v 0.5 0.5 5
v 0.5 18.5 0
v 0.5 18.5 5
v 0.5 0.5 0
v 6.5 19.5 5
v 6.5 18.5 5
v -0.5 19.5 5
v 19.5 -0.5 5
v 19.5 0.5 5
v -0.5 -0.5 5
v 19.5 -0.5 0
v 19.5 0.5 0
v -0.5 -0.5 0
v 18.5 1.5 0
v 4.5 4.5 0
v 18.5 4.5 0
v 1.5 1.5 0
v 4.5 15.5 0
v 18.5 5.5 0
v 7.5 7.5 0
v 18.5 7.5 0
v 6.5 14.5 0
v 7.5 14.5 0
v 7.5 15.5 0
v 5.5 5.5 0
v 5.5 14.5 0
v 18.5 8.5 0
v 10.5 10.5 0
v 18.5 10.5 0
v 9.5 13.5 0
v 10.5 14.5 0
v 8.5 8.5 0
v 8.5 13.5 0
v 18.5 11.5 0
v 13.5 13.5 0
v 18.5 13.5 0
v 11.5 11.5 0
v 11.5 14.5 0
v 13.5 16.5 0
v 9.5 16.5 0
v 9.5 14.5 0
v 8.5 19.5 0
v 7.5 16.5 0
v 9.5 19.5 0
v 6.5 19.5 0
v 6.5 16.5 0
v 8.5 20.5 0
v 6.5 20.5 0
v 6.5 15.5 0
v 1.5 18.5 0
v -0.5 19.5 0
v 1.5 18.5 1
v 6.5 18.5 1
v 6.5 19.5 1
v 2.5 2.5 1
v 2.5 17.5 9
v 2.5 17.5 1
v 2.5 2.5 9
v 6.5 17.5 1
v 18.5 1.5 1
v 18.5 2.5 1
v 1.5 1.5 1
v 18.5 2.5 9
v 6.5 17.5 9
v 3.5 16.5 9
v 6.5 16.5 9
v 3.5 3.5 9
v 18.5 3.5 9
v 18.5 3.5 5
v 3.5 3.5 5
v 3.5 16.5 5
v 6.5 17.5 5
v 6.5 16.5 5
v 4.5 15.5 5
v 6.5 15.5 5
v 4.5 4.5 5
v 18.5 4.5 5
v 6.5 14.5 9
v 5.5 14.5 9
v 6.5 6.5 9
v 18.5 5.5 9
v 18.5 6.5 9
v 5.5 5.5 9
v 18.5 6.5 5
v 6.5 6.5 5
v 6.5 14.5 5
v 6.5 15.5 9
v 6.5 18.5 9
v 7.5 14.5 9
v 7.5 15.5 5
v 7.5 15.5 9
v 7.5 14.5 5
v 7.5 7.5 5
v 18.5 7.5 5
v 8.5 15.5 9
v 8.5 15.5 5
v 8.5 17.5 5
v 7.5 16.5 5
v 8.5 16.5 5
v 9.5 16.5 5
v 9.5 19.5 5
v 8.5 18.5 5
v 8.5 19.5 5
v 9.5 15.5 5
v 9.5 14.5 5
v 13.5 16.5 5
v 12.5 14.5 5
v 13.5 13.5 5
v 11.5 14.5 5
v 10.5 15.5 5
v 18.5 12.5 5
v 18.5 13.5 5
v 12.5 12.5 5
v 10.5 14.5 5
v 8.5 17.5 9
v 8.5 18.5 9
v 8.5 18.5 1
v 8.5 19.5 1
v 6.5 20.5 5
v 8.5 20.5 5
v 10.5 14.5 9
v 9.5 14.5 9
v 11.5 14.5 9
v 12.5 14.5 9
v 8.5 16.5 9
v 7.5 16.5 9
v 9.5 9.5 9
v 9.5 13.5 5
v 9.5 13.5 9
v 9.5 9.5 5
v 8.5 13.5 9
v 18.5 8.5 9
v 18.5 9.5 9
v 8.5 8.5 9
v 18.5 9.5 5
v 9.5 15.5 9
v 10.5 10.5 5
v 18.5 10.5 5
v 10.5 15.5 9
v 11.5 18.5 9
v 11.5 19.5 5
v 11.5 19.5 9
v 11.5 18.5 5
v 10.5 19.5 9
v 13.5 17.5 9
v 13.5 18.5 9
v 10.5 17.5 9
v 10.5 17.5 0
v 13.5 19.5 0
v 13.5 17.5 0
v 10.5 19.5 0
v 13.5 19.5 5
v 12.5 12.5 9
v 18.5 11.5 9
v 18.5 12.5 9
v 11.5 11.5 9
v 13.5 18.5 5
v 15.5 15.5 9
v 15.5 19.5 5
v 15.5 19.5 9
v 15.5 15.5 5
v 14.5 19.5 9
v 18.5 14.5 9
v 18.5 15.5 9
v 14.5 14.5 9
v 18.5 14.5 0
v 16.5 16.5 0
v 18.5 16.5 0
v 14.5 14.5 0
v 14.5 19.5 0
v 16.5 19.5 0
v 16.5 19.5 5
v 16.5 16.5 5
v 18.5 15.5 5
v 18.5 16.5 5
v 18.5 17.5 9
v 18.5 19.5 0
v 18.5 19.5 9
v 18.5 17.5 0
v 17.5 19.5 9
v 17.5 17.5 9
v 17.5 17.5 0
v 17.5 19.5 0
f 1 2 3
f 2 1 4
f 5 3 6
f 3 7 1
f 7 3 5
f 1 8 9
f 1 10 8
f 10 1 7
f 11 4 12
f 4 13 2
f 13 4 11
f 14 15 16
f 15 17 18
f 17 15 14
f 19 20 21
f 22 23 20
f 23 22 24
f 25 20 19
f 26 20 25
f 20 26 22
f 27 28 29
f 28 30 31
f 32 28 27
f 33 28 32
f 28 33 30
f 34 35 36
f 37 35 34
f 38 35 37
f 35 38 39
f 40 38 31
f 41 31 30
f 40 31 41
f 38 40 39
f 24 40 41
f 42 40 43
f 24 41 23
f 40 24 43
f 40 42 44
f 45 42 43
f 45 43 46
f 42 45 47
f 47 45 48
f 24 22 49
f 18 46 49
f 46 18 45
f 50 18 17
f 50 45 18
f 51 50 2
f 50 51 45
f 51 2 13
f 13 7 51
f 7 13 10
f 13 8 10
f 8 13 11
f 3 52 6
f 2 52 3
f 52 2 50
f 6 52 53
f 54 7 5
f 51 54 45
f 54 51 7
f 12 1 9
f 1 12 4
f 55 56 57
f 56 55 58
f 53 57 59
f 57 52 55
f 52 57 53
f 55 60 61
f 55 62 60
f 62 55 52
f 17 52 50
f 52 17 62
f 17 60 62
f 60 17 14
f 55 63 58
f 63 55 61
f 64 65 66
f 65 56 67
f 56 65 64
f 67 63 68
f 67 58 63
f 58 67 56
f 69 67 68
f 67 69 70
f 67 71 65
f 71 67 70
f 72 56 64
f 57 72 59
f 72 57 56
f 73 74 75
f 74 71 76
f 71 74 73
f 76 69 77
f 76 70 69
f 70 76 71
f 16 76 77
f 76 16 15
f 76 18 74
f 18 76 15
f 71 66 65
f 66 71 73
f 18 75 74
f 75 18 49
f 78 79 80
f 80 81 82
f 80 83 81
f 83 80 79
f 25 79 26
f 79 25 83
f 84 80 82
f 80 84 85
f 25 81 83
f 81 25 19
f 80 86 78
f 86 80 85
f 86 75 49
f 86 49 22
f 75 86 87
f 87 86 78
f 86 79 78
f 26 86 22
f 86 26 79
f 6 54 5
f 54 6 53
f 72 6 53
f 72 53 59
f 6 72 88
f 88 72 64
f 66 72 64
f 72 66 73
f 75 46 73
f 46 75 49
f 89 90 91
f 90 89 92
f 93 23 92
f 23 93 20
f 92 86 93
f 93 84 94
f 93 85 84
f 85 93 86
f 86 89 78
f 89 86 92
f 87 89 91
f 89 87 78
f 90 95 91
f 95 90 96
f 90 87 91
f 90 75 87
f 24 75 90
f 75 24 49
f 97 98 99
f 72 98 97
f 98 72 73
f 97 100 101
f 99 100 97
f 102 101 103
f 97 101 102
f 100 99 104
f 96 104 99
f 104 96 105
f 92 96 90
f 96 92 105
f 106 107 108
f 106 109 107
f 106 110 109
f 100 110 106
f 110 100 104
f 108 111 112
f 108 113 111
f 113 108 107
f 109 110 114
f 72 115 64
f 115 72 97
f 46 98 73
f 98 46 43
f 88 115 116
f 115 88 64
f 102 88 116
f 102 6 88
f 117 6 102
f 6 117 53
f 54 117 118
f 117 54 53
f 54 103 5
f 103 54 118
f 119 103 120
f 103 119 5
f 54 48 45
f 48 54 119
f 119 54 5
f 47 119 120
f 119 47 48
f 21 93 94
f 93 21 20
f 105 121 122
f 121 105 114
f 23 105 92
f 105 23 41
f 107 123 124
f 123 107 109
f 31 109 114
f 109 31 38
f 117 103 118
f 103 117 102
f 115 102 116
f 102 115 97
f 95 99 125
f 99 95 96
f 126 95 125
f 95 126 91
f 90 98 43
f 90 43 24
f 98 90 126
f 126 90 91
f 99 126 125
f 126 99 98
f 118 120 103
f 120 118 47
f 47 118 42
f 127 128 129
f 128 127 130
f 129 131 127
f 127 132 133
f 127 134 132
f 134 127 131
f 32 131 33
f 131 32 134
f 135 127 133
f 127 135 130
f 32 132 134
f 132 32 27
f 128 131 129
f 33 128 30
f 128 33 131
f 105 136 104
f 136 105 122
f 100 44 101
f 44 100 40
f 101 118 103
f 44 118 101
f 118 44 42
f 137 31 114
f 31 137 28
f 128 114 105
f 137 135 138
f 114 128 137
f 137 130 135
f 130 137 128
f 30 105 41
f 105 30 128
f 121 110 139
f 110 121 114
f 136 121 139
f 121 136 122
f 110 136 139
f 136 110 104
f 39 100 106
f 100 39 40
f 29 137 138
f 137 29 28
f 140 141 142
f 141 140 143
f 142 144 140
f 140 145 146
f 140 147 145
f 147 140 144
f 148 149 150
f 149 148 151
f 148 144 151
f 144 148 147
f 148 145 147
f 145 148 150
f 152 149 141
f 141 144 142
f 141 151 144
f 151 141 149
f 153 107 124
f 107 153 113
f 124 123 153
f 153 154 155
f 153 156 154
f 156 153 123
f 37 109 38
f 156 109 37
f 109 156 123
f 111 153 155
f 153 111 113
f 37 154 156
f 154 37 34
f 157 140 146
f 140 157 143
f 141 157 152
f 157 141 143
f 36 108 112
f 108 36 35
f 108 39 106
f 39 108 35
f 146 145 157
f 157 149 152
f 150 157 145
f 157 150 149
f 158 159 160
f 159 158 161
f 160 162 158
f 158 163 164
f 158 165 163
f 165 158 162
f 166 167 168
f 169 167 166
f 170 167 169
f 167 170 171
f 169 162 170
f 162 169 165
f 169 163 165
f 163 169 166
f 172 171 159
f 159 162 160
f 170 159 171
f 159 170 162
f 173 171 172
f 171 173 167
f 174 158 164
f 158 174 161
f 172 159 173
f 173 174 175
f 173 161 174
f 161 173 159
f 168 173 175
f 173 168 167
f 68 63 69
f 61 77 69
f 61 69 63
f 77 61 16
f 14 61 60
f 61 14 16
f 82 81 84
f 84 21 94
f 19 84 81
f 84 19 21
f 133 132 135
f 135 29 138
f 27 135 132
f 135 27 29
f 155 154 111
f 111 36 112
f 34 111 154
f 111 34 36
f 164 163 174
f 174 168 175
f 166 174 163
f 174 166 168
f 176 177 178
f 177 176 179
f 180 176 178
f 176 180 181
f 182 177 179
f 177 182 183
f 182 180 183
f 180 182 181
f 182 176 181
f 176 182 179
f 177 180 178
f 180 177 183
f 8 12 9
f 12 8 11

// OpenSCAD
union() {
    translate([0, 0, 2.5]) cube([1, 1, 5], center=true);
    translate([0, 1, 2.5]) cube([1, 1, 5], center=true);
    translate([0, 2, 2.5]) cube([1, 1, 5], center=true);
    translate([0, 3, 2.5]) cube([1, 1, 5], center=true);
    translate([0, 4, 2.5]) cube([1, 1, 5], center=true);
    translate([0, 5, 2.5]) cube([1, 1, 5], center=true);
    translate([0, 6, 2.5]) cube([1, 1, 5], center=true);
    translate([0, 7, 2.5]) cube([1, 1, 5], center=true);
    translate([0, 8, 2.5]) cube([1, 1, 5], center=true);
    translate([0, 9, 2.5]) cube([1, 1, 5], center=true);
    translate([0, 10, 2.5]) cube([1, 1, 5], center=true);
    translate([0, 11, 2.5]) cube([1, 1, 5], center=true);
    translate([0, 12, 2.5]) cube([1, 1, 5], center=true);
    translate([0, 13, 2.5]) cube([1, 1, 5], center=true);
    translate([0, 14, 2.5]) cube([1, 1, 5], center=true);
    translate([0, 15, 2.5]) cube([1, 1, 5], center=true);
    translate([0, 16, 2.5]) cube([1, 1, 5], center=true);
    translate([0, 17, 2.5]) cube([1, 1, 5], center=true);
    translate([0, 18, 2.5]) cube([1, 1, 5], center=true);
    translate([0, 19, 2.5]) cube([1, 1, 5], center=true);
    translate([1, 0, 2.5]) cube([1, 1, 5], center=true);
    translate([1, 19, 2.5]) cube([1, 1, 5], center=true);
    translate([2, 0, 2.5]) cube([1, 1, 5], center=true);
    translate([2, 2, 0.5]) cube([1, 1, 1], center=true);
    translate([2, 3, 0.5]) cube([1, 1, 1], center=true);
    translate([2, 4, 0.5]) cube([1, 1, 1], center=true);
    translate([2, 5, 0.5]) cube([1, 1, 1], center=true);
    translate([2, 6, 0.5]) cube([1, 1, 1], center=true);
    translate([2, 7, 0.5]) cube([1, 1, 1], center=true);
    translate([2, 8, 0.5]) cube([1, 1, 1], center=true);
    translate([2, 9, 0.5]) cube([1, 1, 1], center=true);
    translate([2, 10, 0.5]) cube([1, 1, 1], center=true);
    translate([2, 11, 0.5]) cube([1, 1, 1], center=true);
    translate([2, 12, 0.5]) cube([1, 1, 1], center=true);
    translate([2, 13, 0.5]) cube([1, 1, 1], center=true);
    translate([2, 14, 0.5]) cube([1, 1, 1], center=true);
    translate([2, 15, 0.5]) cube([1, 1, 1], center=true);
    translate([2, 16, 0.5]) cube([1, 1, 1], center=true);
    translate([2, 17, 0.5]) cube([1, 1, 1], center=true);
    translate([2, 18, 0.5]) cube([1, 1, 1], center=true);
    translate([2, 19, 2.5]) cube([1, 1, 5], center=true);
    translate([3, 0, 2.5]) cube([1, 1, 5], center=true);
    translate([3, 2, 0.5]) cube([1, 1, 1], center=true);
    translate([3, 3, 4.5]) cube([1, 1, 9], center=true);
    translate([3, 4, 4.5]) cube([1, 1, 9], center=true);
    translate([3, 5, 4.5]) cube([1, 1, 9], center=true);
    translate([3, 6, 4.5]) cube([1, 1, 9], center=true);
    translate([3, 7, 4.5]) cube([1, 1, 9], center=true);
    translate([3, 8, 4.5]) cube([1, 1, 9], center=true);
    translate([3, 9, 4.5]) cube([1, 1, 9], center=true);
    translate([3, 10, 4.5]) cube([1, 1, 9], center=true);
    translate([3, 11, 4.5]) cube([1, 1, 9], center=true);
    translate([3, 12, 4.5]) cube([1, 1, 9], center=true);
    translate([3, 13, 4.5]) cube([1, 1, 9], center=true);
    translate([3, 14, 4.5]) cube([1, 1, 9], center=true);
    translate([3, 15, 4.5]) cube([1, 1, 9], center=true);
    translate([3, 16, 4.5]) cube([1, 1, 9], center=true);
    translate([3, 17, 4.5]) cube([1, 1, 9], center=true);
    translate([3, 18, 0.5]) cube([1, 1, 1], center=true);
    translate([3, 19, 2.5]) cube([1, 1, 5], center=true);
    translate([4, 0, 2.5]) cube([1, 1, 5], center=true);
    translate([4, 2, 0.5]) cube([1, 1, 1], center=true);
    translate([4, 3, 4.5]) cube([1, 1, 9], center=true);
    translate([4, 4, 2.5]) cube([1, 1, 5], center=true);
    translate([4, 5, 2.5]) cube([1, 1, 5], center=true);
    translate([4, 6, 2.5]) cube([1, 1, 5], center=true);
    translate([4, 7, 2.5]) cube([1, 1, 5], center=true);
    translate([4, 8, 2.5]) cube([1, 1, 5], center=true);
    translate([4, 9, 2.5]) cube([1, 1, 5], center=true);
    translate([4, 10, 2.5]) cube([1, 1, 5], center=true);
    translate([4, 11, 2.5]) cube([1, 1, 5], center=true);
    translate([4, 12, 2.5]) cube([1, 1, 5], center=true);
    translate([4, 13, 2.5]) cube([1, 1, 5], center=true);
    translate([4, 14, 2.5]) cube([1, 1, 5], center=true);
    translate([4, 15, 2.5]) cube([1, 1, 5], center=true);
    translate([4, 16, 2.5]) cube([1, 1, 5], center=true);
    translate([4, 17, 4.5]) cube([1, 1, 9], center=true);
    translate([4, 18, 0.5]) cube([1, 1, 1], center=true);
    translate([4, 19, 2.5]) cube([1, 1, 5], center=true);
    translate([5, 0, 2.5]) cube([1, 1, 5], center=true);
    translate([5, 2, 0.5]) cube([1, 1, 1], center=true);
    translate([5, 3, 4.5]) cube([1, 1, 9], center=true);
    translate([5, 4, 2.5]) cube([1, 1, 5], center=true);
    translate([5, 16, 2.5]) cube([1, 1, 5], center=true);
    translate([5, 17, 4.5]) cube([1, 1, 9], center=true);
    translate([5, 18, 0.5]) cube([1, 1, 1], center=true);
    translate([5, 19, 2.5]) cube([1, 1, 5], center=true);
    translate([6, 0, 2.5]) cube([1, 1, 5], center=true);
    translate([6, 2, 0.5]) cube([1, 1, 1], center=true);
    translate([6, 3, 4.5]) cube([1, 1, 9], center=true);
    translate([6, 4, 2.5]) cube([1, 1, 5], center=true);
    translate([6, 6, 4.5]) cube([1, 1, 9], center=true);
    translate([6, 7, 4.5]) cube([1, 1, 9], center=true);
    translate([6, 8, 4.5]) cube([1, 1, 9], center=true);
    translate([6, 9, 4.5]) cube([1, 1, 9], center=true);
    translate([6, 10, 4.5]) cube([1, 1, 9], center=true);
    translate([6, 11, 4.5]) cube([1, 1, 9], center=true);
    translate([6, 12, 4.5]) cube([1, 1, 9], center=true);
    translate([6, 13, 4.5]) cube([1, 1, 9], center=true);
    translate([6, 14, 4.5]) cube([1, 1, 9], center=true);
    translate([6, 16, 2.5]) cube([1, 1, 5], center=true);
    translate([6, 17, 4.5]) cube([1, 1, 9], center=true);
    translate([6, 18, 0.5]) cube([1, 1, 1], center=true);
    translate([6, 19, 2.5]) cube([1, 1, 5], center=true);
    translate([7, 0, 2.5]) cube([1, 1, 5], center=true);
    translate([7, 2, 0.5]) cube([1, 1, 1], center=true);
    translate([7, 3, 4.5]) cube([1, 1, 9], center=true);
    translate([7, 4, 2.5]) cube([1, 1, 5], center=true);
    translate([7, 6, 4.5]) cube([1, 1, 9], center=true);
    translate([7, 7, 2.5]) cube([1, 1, 5], center=true);
    translate([7, 8, 2.5]) cube([1, 1, 5], center=true);
    translate([7, 9, 2.5]) cube([1, 1, 5], center=true);
    translate([7, 10, 2.5]) cube([1, 1, 5], center=true);
    translate([7, 11, 2.5]) cube([1, 1, 5], center=true);
    translate([7, 12, 2.5]) cube([1, 1, 5], center=true);
    translate([7, 13, 2.5]) cube([1, 1, 5], center=true);
    translate([7, 14, 2.5]) cube([1, 1, 5], center=true);
    translate([7, 15, 4.5]) cube([1, 1, 9], center=true);
    translate([7, 17, 2.5]) cube([1, 1, 5], center=true);
    translate([7, 18, 4.5]) cube([1, 1, 9], center=true);
    translate([7, 19, 0.5]) cube([1, 1, 1], center=true);
    translate([7, 20, 2.5]) cube([1, 1, 5], center=true);
    translate([8, 0, 2.5]) cube([1, 1, 5], center=true);
    translate([8, 2, 0.5]) cube([1, 1, 1], center=true);
    translate([8, 3, 4.5]) cube([1, 1, 9], center=true);
    translate([8, 4, 2.5]) cube([1, 1, 5], center=true);
    translate([8, 6, 4.5]) cube([1, 1, 9], center=true);
    translate([8, 7, 2.5]) cube([1, 1, 5], center=true);
    translate([8, 15, 2.5]) cube([1, 1, 5], center=true);
    translate([8, 16, 4.5]) cube([1, 1, 9], center=true);
    translate([8, 17, 2.5]) cube([1, 1, 5], center=true);
    translate([8, 18, 4.5]) cube([1, 1, 9], center=true);
    translate([8, 19, 0.5]) cube([1, 1, 1], center=true);
    translate([8, 20, 2.5]) cube([1, 1, 5], center=true);
    translate([9, 0, 2.5]) cube([1, 1, 5], center=true);
    translate([9, 2, 0.5]) cube([1, 1, 1], center=true);
    translate([9, 3, 4.5]) cube([1, 1, 9], center=true);
    translate([9, 4, 2.5]) cube([1, 1, 5], center=true);
    translate([9, 6, 4.5]) cube([1, 1, 9], center=true);
    translate([9, 7, 2.5]) cube([1, 1, 5], center=true);
    translate([9, 9, 4.5]) cube([1, 1, 9], center=true);
    translate([9, 10, 4.5]) cube([1, 1, 9], center=true);
    translate([9, 11, 4.5]) cube([1, 1, 9], center=true);
    translate([9, 12, 4.5]) cube([1, 1, 9], center=true);
    translate([9, 13, 4.5]) cube([1, 1, 9], center=true);
    translate([9, 15, 2.5]) cube([1, 1, 5], center=true);
    translate([9, 16, 2.5]) cube([1, 1, 5], center=true);
    translate([9, 17, 2.5]) cube([1, 1, 5], center=true);
    translate([9, 18, 2.5]) cube([1, 1, 5], center=true);
    translate([9, 19, 2.5]) cube([1, 1, 5], center=true);
    translate([10, 0, 2.5]) cube([1, 1, 5], center=true);
    translate([10, 2, 0.5]) cube([1, 1, 1], center=true);
    translate([10, 3, 4.5]) cube([1, 1, 9], center=true);
    translate([10, 4, 2.5]) cube([1, 1, 5], center=true);
    translate([10, 6, 4.5]) cube([1, 1, 9], center=true);
    translate([10, 7, 2.5]) cube([1, 1, 5], center=true);
    translate([10, 9, 4.5]) cube([1, 1, 9], center=true);
    translate([10, 10, 2.5]) cube([1, 1, 5], center=true);
    translate([10, 11, 2.5]) cube([1, 1, 5], center=true);
    translate([10, 12, 2.5]) cube([1, 1, 5], center=true);
    translate([10, 13, 2.5]) cube([1, 1, 5], center=true);
    translate([10, 14, 2.5]) cube([1, 1, 5], center=true);
    translate([10, 15, 4.5]) cube([1, 1, 9], center=true);
    translate([10, 16, 2.5]) cube([1, 1, 5], center=true);
    translate([11, 0, 2.5]) cube([1, 1, 5], center=true);
    translate([11, 2, 0.5]) cube([1, 1, 1], center=true);
    translate([11, 3, 4.5]) cube([1, 1, 9], center=true);
    translate([11, 4, 2.5]) cube([1, 1, 5], center=true);
    translate([11, 6, 4.5]) cube([1, 1, 9], center=true);
    translate([11, 7, 2.5]) cube([1, 1, 5], center=true);
    translate([11, 9, 4.5]) cube([1, 1, 9], center=true);
    translate([11, 10, 2.5]) cube([1, 1, 5], center=true);
    translate([11, 15, 2.5]) cube([1, 1, 5], center=true);
    translate([11, 16, 2.5]) cube([1, 1, 5], center=true);
    translate([11, 18, 4.5]) cube([1, 1, 9], center=true);
    translate([11, 19, 4.5]) cube([1, 1, 9], center=true);
    translate([12, 0, 2.5]) cube([1, 1, 5], center=true);
    translate([12, 2, 0.5]) cube([1, 1, 1], center=true);
    translate([12, 3, 4.5]) cube([1, 1, 9], center=true);
    translate([12, 4, 2.5]) cube([1, 1, 5], center=true);
    translate([12, 6, 4.5]) cube([1, 1, 9], center=true);
    translate([12, 7, 2.5]) cube([1, 1, 5], center=true);
    translate([12, 9, 4.5]) cube([1, 1, 9], center=true);
    translate([12, 10, 2.5]) cube([1, 1, 5], center=true);
    translate([12, 12, 4.5]) cube([1, 1, 9], center=true);
    translate([12, 13, 4.5]) cube([1, 1, 9], center=true);
    translate([12, 14, 4.5]) cube([1, 1, 9], center=true);
    translate([12, 15, 2.5]) cube([1, 1, 5], center=true);
    translate([12, 16, 2.5]) cube([1, 1, 5], center=true);
    translate([12, 18, 4.5]) cube([1, 1, 9], center=true);
    translate([12, 19, 2.5]) cube([1, 1, 5], center=true);
    translate([13, 0, 2.5]) cube([1, 1, 5], center=true);
    translate([13, 2, 0.5]) cube([1, 1, 1], center=true);
    translate([13, 3, 4.5]) cube([1, 1, 9], center=true);
    translate([13, 4, 2.5]) cube([1, 1, 5], center=true);
    translate([13, 6, 4.5]) cube([1, 1, 9], center=true);
    translate([13, 7, 2.5]) cube([1, 1, 5], center=true);
    translate([13, 9, 4.5]) cube([1, 1, 9], center=true);
    translate([13, 10, 2.5]) cube([1, 1, 5], center=true);
    translate([13, 12, 4.5]) cube([1, 1, 9], center=true);
    translate([13, 13, 2.5]) cube([1, 1, 5], center=true);
    translate([13, 14, 2.5]) cube([1, 1, 5], center=true);
    translate([13, 15, 2.5]) cube([1, 1, 5], center=true);
    translate([13, 16, 2.5]) cube([1, 1, 5], center=true);
    translate([13, 18, 4.5]) cube([1, 1, 9], center=true);
    translate([13, 19, 2.5]) cube([1, 1, 5], center=true);
    translate([14, 0, 2.5]) cube([1, 1, 5], center=true);
    translate([14, 2, 0.5]) cube([1, 1, 1], center=true);
    translate([14, 3, 4.5]) cube([1, 1, 9], center=true);
    translate([14, 4, 2.5]) cube([1, 1, 5], center=true);
    translate([14, 6, 4.5]) cube([1, 1, 9], center=true);
    translate([14, 7, 2.5]) cube([1, 1, 5], center=true);
    translate([14, 9, 4.5]) cube([1, 1, 9], center=true);
    translate([14, 10, 2.5]) cube([1, 1, 5], center=true);
    translate([14, 12, 4.5]) cube([1, 1, 9], center=true);
    translate([14, 13, 2.5]) cube([1, 1, 5], center=true);
    translate([15, 0, 2.5]) cube([1, 1, 5], center=true);
    translate([15, 2, 0.5]) cube([1, 1, 1], center=true);
    translate([15, 3, 4.5]) cube([1, 1, 9], center=true);
    translate([15, 4, 2.5]) cube([1, 1, 5], center=true);
    translate([15, 6, 4.5]) cube([1, 1, 9], center=true);
    translate([15, 7, 2.5]) cube([1, 1, 5], center=true);
    translate([15, 9, 4.5]) cube([1, 1, 9], center=true);
    translate([15, 10, 2.5]) cube([1, 1, 5], center=true);
    translate([15, 12, 4.5]) cube([1, 1, 9], center=true);
    translate([15, 13, 2.5]) cube([1, 1, 5], center=true);
    translate([15, 15, 4.5]) cube([1, 1, 9], center=true);
    translate([15, 16, 4.5]) cube([1, 1, 9], center=true);
    translate([15, 17, 4.5]) cube([1, 1, 9], center=true);
    translate([15, 18, 4.5]) cube([1, 1, 9], center=true);
    translate([15, 19, 4.5]) cube([1, 1, 9], center=true);
    translate([16, 0, 2.5]) cube([1, 1, 5], center=true);
    translate([16, 2, 0.5]) cube([1, 1, 1], center=true);
    translate([16, 3, 4.5]) cube([1, 1, 9], center=true);
    translate([16, 4, 2.5]) cube([1, 1, 5], center=true);
    translate([16, 6, 4.5]) cube([1, 1, 9], center=true);
    translate([16, 7, 2.5]) cube([1, 1, 5], center=true);
    translate([16, 9, 4.5]) cube([1, 1, 9], center=true);
    translate([16, 10, 2.5]) cube([1, 1, 5], center=true);
    translate([16, 12, 4.5]) cube([1, 1, 9], center=true);
    translate([16, 13, 2.5]) cube([1, 1, 5], center=true);
    translate([16, 15, 4.5]) cube([1, 1, 9], center=true);
    translate([16, 16, 2.5]) cube([1, 1, 5], center=true);
    translate([16, 17, 2.5]) cube([1, 1, 5], center=true);
    translate([16, 18, 2.5]) cube([1, 1, 5], center=true);
    translate([16, 19, 2.5]) cube([1, 1, 5], center=true);
    translate([17, 0, 2.5]) cube([1, 1, 5], center=true);
    translate([17, 2, 0.5]) cube([1, 1, 1], center=true);
    translate([17, 3, 4.5]) cube([1, 1, 9], center=true);
    translate([17, 4, 2.5]) cube([1, 1, 5], center=true);
    translate([17, 6, 4.5]) cube([1, 1, 9], center=true);
    translate([17, 7, 2.5]) cube([1, 1, 5], center=true);
    translate([17, 9, 4.5]) cube([1, 1, 9], center=true);
    translate([17, 10, 2.5]) cube([1, 1, 5], center=true);
    translate([17, 12, 4.5]) cube([1, 1, 9], center=true);
    translate([17, 13, 2.5]) cube([1, 1, 5], center=true);
    translate([17, 15, 4.5]) cube([1, 1, 9], center=true);
    translate([17, 16, 2.5]) cube([1, 1, 5], center=true);
    translate([18, 0, 2.5]) cube([1, 1, 5], center=true);
    translate([18, 2, 0.5]) cube([1, 1, 1], center=true);
    translate([18, 3, 4.5]) cube([1, 1, 9], center=true);
    translate([18, 4, 2.5]) cube([1, 1, 5], center=true);
    translate([18, 6, 4.5]) cube([1, 1, 9], center=true);
    translate([18, 7, 2.5]) cube([1, 1, 5], center=true);
    translate([18, 9, 4.5]) cube([1, 1, 9], center=true);
    translate([18, 10, 2.5]) cube([1, 1, 5], center=true);
    translate([18, 12, 4.5]) cube([1, 1, 9], center=true);
    translate([18, 13, 2.5]) cube([1, 1, 5], center=true);
    translate([18, 15, 4.5]) cube([1, 1, 9], center=true);
    translate([18, 16, 2.5]) cube([1, 1, 5], center=true);
    translate([18, 18, 4.5]) cube([1, 1, 9], center=true);
    translate([18, 19, 4.5]) cube([1, 1, 9], center=true);
    translate([19, 0, 2.5]) cube([1, 1, 5], center=true);
}
